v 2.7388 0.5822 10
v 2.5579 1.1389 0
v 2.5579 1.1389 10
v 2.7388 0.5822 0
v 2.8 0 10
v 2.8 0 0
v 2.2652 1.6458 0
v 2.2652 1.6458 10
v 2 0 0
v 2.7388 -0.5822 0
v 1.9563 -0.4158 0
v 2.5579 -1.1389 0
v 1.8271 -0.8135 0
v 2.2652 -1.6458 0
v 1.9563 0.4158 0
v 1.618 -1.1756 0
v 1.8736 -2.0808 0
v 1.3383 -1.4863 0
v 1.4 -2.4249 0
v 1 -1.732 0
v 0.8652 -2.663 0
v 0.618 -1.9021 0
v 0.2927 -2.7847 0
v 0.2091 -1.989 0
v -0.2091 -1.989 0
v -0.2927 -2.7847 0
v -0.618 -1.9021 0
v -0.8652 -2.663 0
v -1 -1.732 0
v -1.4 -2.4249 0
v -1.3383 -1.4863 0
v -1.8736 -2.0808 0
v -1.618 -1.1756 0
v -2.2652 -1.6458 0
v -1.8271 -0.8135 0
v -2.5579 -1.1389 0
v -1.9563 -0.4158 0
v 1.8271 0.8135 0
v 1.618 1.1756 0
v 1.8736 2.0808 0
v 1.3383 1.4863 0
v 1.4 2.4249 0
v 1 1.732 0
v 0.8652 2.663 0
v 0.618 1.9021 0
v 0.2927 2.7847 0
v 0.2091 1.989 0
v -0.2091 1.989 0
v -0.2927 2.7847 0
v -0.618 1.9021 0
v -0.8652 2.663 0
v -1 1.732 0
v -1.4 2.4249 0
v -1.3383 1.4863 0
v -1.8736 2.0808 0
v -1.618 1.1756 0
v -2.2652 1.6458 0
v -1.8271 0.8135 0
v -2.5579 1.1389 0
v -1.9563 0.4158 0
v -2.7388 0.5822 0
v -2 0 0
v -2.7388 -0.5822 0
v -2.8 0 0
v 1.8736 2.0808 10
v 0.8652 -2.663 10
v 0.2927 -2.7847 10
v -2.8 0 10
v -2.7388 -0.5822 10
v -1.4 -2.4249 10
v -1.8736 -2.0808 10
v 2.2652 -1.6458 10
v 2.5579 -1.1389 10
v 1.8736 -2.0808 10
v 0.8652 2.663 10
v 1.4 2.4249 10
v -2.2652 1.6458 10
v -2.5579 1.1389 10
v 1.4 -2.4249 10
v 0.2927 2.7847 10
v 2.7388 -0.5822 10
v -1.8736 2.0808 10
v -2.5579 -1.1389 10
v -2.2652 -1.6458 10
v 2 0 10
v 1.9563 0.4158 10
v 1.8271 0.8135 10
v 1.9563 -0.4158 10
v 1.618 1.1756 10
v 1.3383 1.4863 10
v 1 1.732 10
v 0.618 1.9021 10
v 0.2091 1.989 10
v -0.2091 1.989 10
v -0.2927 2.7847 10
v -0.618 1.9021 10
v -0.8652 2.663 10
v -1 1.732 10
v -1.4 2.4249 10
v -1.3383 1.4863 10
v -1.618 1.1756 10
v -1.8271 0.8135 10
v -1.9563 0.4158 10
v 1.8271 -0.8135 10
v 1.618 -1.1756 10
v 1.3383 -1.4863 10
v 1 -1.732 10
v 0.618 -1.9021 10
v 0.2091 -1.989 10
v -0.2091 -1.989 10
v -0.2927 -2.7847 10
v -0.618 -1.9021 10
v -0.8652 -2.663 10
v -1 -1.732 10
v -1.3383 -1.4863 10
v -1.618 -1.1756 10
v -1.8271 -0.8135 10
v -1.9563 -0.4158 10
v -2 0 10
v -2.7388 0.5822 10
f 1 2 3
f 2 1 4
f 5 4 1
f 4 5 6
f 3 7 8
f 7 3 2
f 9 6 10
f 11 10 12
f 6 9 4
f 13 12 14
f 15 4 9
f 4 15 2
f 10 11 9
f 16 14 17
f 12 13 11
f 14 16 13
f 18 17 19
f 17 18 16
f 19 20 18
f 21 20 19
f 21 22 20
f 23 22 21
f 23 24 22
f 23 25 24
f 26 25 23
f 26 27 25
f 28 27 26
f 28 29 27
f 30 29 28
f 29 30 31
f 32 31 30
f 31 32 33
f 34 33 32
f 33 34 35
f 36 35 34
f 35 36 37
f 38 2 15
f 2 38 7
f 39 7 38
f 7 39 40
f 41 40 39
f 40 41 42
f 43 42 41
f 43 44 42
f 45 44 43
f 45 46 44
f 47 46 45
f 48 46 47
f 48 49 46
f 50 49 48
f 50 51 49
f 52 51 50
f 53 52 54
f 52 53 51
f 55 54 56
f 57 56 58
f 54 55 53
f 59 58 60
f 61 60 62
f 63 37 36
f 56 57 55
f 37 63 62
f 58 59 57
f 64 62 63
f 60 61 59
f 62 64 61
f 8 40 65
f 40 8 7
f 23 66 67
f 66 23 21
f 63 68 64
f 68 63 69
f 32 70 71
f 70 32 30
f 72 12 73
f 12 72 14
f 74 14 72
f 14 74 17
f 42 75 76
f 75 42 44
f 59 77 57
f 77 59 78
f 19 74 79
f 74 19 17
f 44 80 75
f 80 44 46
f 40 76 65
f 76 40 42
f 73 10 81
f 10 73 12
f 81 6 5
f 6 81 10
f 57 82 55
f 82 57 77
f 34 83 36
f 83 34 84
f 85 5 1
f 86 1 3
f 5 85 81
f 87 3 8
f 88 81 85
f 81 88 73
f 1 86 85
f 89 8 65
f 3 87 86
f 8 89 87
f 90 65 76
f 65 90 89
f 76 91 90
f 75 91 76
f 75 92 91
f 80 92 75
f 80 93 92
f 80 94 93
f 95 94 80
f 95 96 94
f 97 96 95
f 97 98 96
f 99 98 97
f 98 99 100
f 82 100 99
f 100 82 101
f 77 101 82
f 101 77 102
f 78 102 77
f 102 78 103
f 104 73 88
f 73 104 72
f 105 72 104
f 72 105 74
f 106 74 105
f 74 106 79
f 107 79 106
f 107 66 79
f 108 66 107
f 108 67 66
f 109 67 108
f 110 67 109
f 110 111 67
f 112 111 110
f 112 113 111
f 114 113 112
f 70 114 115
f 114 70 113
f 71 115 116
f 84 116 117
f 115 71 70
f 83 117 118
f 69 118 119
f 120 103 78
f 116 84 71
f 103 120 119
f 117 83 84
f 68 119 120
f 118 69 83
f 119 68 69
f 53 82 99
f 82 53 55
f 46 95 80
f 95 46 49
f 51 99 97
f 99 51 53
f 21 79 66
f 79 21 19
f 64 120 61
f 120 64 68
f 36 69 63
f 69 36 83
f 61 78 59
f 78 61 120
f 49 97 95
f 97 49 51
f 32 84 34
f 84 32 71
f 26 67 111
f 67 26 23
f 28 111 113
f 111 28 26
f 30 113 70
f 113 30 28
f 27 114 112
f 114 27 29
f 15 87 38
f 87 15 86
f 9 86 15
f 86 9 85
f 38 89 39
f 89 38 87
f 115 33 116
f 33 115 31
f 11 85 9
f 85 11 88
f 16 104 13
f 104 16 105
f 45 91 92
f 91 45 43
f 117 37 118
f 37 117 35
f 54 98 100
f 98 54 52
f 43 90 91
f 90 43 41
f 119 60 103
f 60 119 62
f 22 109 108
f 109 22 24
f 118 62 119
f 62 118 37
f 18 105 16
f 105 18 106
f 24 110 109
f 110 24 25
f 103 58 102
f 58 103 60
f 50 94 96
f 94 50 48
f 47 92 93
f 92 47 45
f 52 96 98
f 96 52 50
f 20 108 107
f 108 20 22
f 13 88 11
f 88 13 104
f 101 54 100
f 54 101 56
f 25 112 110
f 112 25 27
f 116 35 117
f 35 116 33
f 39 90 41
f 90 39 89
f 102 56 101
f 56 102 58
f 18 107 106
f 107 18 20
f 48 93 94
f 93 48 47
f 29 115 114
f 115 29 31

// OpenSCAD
thickness = 0.8;
screw_diameter = 4;
base_height = 5;

screen_width = 36;
screen_length = 80;
screen_screw_x = (screen_width - 31) / 2;
screen_screw_y = (screen_length - 75) / 2;

pcb_width = 50;
pcb_length = 70;
pcb_screw_x = 2.5;
pcb_screw_y = 3;

pcb_screen_x = 8.5;
pcb_screen_y = 37;
screen_pin_offset_x = 8;
screen_pin_offset_y = 2.5;

screen_screw_sustainer = 10;

$fn=30;

module Screw(diameter=screw_diameter)
{
    circle(d=diameter);
}

module ScreenBase(width=screen_width, length=screen_length, screw_x=screen_screw_x, screw_y=screen_screw_y, add_screws=1)
{
    difference()
    {
        square([length, width]);
        if(add_screws)
        {
            translate([screw_x, screw_y])
            Screw();
            translate([length -screw_x, screw_y])
            Screw();
            translate([screw_x, width - screw_y])
            Screw();
            translate([length -screw_x, width - screw_y])
            Screw();
        }
    }
}

module PCBBase(width=pcb_width, length=pcb_length, screw_x=pcb_screw_x, screw_y=pcb_screw_y, add_screws=1)
{
    difference()
    {
        square([length, width]);
        if(add_screws)
        {
            translate([screw_x, screw_y])
            Screw();
            translate([length -screw_x, screw_y])
            Screw();
            translate([screw_x, width - screw_y])
            Screw();
            translate([length -screw_x, width - screw_y])
            Screw();
        }
    }
}

module Base2d(add_screws=1)
{
    PCBBase(add_screws=add_screws);
    translate([pcb_screen_x - screen_pin_offset_x, pcb_screen_y - screen_pin_offset_y])
    ScreenBase(add_screws=add_screws);
}

module Base()
{
    translate([0, 0, base_height])
    rotate([0, 180, 0])
    {
        linear_extrude(height = base_height)
        difference()
        {
            offset(r=thickness)
            {
                Base2d();
            }
            Base2d(add_screws=0);
        }
        translate([0, 0, base_height - thickness])
        linear_extrude(height = thickness)
        Base2d();
    }
}

module ScrewSustainer()
{
    difference()
    {
        cylinder(d=screw_diameter + 2 * thickness, h=screen_screw_sustainer);
        cylinder(d=screw_diameter, h=screen_screw_sustainer);
    }
}

//Base();
ScrewSustainer();
